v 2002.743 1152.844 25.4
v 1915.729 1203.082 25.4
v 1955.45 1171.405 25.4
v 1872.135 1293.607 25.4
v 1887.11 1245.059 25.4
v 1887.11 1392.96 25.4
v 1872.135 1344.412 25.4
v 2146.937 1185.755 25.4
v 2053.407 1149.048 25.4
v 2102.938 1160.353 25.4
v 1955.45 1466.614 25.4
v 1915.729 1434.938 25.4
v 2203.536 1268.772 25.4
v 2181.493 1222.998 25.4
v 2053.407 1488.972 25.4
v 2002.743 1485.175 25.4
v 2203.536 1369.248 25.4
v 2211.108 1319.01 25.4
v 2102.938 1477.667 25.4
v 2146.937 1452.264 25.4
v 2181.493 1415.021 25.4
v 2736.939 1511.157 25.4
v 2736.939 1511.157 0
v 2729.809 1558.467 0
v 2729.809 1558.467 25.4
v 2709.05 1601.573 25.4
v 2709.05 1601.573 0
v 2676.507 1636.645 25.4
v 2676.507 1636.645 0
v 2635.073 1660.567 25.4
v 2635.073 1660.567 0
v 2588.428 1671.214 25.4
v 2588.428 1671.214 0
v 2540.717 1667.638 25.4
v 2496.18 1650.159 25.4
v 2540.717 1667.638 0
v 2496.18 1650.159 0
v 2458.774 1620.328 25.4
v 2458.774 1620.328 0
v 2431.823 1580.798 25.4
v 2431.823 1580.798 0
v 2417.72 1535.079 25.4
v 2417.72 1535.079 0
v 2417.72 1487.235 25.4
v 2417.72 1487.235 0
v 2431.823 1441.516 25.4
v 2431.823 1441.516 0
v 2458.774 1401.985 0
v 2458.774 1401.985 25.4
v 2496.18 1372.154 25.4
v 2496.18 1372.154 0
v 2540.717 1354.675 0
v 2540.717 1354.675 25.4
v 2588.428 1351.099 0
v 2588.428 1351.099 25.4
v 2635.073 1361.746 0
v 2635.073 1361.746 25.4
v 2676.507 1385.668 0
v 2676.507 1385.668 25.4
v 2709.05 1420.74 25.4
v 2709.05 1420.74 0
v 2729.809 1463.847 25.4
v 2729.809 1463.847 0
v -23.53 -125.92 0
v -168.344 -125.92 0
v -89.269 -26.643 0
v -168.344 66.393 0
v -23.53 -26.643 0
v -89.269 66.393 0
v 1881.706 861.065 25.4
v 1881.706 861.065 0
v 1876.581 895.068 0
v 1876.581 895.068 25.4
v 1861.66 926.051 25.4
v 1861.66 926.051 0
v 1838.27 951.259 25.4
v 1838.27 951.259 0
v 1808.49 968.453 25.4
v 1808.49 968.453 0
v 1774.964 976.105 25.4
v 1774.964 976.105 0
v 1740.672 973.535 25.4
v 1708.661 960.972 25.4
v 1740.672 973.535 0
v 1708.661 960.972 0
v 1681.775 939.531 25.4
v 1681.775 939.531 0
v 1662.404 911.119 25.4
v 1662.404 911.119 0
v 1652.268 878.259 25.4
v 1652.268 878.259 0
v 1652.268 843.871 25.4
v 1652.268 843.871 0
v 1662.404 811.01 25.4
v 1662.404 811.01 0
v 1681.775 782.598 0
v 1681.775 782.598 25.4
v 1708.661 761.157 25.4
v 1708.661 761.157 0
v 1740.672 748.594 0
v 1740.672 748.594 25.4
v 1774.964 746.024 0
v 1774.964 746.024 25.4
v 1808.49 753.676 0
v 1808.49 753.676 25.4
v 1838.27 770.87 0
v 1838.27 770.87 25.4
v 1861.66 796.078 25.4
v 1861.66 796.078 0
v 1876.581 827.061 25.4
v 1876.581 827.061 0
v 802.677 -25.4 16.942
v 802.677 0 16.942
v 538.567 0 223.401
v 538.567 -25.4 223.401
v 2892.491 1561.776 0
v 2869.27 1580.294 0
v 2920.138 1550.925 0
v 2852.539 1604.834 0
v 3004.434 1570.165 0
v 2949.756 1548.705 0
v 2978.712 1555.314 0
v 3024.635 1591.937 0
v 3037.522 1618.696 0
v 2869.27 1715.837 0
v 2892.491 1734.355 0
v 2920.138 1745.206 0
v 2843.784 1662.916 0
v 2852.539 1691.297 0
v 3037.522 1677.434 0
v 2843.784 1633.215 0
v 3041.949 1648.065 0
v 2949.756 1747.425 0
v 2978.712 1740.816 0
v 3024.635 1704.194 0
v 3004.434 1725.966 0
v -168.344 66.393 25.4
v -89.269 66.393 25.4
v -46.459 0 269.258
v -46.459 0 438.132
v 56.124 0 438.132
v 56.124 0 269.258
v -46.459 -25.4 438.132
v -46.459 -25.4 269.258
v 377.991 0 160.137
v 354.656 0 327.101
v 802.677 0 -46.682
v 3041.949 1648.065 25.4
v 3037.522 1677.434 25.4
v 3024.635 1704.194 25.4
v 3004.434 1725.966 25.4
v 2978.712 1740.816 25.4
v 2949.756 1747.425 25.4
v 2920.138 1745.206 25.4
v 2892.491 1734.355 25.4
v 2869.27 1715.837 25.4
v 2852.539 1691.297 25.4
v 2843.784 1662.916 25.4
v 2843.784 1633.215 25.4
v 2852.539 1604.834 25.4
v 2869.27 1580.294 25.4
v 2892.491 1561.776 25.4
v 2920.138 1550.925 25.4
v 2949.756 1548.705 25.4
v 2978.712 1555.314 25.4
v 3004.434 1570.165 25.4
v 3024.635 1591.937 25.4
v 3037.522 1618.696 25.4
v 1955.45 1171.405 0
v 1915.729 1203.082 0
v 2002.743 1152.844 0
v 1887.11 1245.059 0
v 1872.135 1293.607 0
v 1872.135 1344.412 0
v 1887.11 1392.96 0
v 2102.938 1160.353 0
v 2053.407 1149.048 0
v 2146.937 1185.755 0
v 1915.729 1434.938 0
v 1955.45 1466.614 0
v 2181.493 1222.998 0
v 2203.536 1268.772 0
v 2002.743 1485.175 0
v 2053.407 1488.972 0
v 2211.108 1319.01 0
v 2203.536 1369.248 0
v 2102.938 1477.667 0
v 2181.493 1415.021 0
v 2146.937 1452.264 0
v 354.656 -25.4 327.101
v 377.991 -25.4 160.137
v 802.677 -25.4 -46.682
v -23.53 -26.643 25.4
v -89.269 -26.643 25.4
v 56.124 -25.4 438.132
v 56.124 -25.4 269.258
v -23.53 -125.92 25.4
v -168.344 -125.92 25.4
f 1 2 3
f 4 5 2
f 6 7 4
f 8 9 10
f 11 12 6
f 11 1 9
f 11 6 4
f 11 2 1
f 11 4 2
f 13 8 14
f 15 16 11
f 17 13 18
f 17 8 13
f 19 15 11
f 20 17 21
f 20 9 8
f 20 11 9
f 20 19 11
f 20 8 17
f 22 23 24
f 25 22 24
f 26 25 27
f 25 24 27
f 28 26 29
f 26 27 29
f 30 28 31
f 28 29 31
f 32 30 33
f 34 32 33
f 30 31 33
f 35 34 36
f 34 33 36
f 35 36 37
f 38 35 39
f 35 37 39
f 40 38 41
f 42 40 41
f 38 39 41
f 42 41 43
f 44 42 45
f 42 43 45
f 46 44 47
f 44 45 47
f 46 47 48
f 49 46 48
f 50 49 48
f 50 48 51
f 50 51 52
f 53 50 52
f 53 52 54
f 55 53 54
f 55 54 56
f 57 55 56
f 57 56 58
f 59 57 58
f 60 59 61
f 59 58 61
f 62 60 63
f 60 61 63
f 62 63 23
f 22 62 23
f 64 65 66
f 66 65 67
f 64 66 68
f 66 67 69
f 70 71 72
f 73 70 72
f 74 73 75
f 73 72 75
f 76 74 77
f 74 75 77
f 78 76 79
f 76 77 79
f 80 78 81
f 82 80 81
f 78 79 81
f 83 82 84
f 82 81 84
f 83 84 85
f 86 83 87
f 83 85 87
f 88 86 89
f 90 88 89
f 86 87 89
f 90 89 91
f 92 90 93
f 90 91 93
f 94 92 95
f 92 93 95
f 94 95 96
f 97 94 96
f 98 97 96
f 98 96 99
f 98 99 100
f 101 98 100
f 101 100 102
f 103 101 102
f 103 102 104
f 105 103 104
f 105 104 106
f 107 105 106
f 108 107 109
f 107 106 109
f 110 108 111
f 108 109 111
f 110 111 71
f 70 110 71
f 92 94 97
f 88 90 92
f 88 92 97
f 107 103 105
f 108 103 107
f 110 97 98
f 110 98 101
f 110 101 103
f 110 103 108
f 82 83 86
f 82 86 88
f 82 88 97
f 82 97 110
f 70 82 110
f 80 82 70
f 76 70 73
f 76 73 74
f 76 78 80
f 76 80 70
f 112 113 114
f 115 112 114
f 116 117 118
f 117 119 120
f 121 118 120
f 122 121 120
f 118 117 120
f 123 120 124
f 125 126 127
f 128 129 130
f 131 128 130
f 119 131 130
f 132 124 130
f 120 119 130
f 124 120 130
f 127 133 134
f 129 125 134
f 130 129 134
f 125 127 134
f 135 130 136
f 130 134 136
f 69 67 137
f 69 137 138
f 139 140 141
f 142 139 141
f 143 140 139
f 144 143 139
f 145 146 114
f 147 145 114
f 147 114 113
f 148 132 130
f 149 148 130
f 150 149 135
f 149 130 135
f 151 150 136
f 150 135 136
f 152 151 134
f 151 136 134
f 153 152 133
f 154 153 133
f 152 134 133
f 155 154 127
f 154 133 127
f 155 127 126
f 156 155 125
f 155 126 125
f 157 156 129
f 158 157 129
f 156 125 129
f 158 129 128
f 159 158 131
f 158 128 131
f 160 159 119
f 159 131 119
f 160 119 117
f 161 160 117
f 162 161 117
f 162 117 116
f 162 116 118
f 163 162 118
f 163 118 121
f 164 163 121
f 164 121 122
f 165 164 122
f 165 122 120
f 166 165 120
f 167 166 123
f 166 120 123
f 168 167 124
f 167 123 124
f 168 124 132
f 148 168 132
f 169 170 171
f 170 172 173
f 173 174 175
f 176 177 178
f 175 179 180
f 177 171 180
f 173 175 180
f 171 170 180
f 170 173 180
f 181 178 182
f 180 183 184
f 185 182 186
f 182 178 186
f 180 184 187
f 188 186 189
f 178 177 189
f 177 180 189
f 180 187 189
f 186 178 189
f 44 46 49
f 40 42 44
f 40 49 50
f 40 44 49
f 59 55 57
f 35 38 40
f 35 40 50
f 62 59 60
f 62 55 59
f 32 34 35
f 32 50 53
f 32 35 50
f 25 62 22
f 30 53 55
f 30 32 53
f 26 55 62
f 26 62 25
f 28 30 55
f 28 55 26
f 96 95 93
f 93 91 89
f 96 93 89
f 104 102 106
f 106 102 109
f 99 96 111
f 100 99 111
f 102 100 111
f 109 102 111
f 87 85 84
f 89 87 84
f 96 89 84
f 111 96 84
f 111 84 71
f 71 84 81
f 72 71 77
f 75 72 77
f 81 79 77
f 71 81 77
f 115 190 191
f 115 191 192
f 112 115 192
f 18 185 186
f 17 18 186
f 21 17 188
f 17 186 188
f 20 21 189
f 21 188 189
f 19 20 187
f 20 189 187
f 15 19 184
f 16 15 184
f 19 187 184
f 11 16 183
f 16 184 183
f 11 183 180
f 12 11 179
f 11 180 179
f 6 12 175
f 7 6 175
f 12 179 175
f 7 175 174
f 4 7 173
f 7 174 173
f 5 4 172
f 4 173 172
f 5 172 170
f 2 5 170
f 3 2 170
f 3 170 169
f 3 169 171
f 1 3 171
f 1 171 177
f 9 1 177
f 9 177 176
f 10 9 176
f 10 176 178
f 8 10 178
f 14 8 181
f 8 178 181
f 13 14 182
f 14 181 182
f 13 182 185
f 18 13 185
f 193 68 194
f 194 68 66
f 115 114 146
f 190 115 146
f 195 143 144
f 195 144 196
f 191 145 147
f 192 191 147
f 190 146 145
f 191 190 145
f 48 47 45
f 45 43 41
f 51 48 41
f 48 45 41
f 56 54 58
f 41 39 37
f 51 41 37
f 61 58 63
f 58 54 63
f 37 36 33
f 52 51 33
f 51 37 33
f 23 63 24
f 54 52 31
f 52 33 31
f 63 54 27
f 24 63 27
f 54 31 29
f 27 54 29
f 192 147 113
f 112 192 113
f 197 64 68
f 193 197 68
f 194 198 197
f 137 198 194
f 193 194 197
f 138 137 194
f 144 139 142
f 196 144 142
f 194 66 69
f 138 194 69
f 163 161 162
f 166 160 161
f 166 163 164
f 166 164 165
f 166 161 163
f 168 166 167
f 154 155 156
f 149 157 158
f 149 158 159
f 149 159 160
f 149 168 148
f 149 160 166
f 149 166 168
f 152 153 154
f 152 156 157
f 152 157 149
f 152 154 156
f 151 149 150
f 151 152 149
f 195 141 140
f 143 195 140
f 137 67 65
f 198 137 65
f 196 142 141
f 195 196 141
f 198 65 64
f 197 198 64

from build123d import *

# Parameters (mm, degrees)
F0_W     = 79.07515
F0_H     = 26.642554
F0_H_2   = 66.393085
F1_DEPTH = 25.4
F2_W     = 51.173338
F2_H     = 56.635827
F2_W_2   = 51.409009
F2_H_2   = 112.238943
F3_DEPTH = 25.4
F5_DEPTH = 25.4
F6_R     = 170.438815
F6_R_2   = 160.505994
F6_R_3   = 115.363138
F6_R_4   = 99.638686
F7_DEPTH = 25.4


with BuildPart() as f1:
    # F0 (on Top) → F1 (new body)
    with BuildSketch(Plane.XY):
        Polygon((-168.34414, -26.642554), (-168.34414, -125.920385), (-23.529731, -125.920385), (-23.529731, -26.642554), (-89.26899, -26.642554), align=None)
        with Locations((-128.806565, -13.321277)):
            Rectangle(F0_W, F0_H)
        with Locations((-128.806565, 33.196542)):
            Rectangle(F0_W, F0_H_2)
    extrude(amount=F1_DEPTH)


with BuildPart() as f3:
    # F2 (on Front) → F3 (new body)
    with BuildSketch(Plane.XZ):
        with Locations((-20.872004, 297.575579)):
            Rectangle(F2_W, F2_H)
        with Locations((30.419169, 297.575579)):
            Rectangle(F2_W_2, F2_H)
        with Locations((-20.872004, 382.012963)):
            Rectangle(F2_W, F2_H_2)
        with Locations((30.419169, 382.012963)):
            Rectangle(F2_W_2, F2_H_2)
    extrude(amount=F3_DEPTH)


with BuildPart() as f5:
    # F4 (on Front) → F5 (new body)
    with BuildSketch(Plane.XZ):
        Polygon((538.567483, 223.400995), (354.655534, 327.100605), (377.99108, 160.137326), (802.676916, -46.682347), (802.676916, 16.942477), (538.567483, 148.019239), align=None)
        Polygon((802.676916, 16.942477), (538.567483, 223.400995), (538.567483, 148.019239), align=None)
    extrude(amount=F5_DEPTH)


with BuildPart() as f7:
    # F6 (on Top) → F7 (new body)
    with BuildSketch(Plane.XY):
        with Locations((2040.66968, 1319.009781)):
            Circle(F6_R)
        with Locations((2576.43342, 1511.156678)):
            Circle(F6_R_2)
        with Locations((1766.34264, 861.064613)):
            Circle(F6_R_3)
        with Locations((2942.310095, 1648.065329)):
            Circle(F6_R_4)
    extrude(amount=F7_DEPTH)


solid = Compound([f1.part, f3.part, f5.part, f7.part])
